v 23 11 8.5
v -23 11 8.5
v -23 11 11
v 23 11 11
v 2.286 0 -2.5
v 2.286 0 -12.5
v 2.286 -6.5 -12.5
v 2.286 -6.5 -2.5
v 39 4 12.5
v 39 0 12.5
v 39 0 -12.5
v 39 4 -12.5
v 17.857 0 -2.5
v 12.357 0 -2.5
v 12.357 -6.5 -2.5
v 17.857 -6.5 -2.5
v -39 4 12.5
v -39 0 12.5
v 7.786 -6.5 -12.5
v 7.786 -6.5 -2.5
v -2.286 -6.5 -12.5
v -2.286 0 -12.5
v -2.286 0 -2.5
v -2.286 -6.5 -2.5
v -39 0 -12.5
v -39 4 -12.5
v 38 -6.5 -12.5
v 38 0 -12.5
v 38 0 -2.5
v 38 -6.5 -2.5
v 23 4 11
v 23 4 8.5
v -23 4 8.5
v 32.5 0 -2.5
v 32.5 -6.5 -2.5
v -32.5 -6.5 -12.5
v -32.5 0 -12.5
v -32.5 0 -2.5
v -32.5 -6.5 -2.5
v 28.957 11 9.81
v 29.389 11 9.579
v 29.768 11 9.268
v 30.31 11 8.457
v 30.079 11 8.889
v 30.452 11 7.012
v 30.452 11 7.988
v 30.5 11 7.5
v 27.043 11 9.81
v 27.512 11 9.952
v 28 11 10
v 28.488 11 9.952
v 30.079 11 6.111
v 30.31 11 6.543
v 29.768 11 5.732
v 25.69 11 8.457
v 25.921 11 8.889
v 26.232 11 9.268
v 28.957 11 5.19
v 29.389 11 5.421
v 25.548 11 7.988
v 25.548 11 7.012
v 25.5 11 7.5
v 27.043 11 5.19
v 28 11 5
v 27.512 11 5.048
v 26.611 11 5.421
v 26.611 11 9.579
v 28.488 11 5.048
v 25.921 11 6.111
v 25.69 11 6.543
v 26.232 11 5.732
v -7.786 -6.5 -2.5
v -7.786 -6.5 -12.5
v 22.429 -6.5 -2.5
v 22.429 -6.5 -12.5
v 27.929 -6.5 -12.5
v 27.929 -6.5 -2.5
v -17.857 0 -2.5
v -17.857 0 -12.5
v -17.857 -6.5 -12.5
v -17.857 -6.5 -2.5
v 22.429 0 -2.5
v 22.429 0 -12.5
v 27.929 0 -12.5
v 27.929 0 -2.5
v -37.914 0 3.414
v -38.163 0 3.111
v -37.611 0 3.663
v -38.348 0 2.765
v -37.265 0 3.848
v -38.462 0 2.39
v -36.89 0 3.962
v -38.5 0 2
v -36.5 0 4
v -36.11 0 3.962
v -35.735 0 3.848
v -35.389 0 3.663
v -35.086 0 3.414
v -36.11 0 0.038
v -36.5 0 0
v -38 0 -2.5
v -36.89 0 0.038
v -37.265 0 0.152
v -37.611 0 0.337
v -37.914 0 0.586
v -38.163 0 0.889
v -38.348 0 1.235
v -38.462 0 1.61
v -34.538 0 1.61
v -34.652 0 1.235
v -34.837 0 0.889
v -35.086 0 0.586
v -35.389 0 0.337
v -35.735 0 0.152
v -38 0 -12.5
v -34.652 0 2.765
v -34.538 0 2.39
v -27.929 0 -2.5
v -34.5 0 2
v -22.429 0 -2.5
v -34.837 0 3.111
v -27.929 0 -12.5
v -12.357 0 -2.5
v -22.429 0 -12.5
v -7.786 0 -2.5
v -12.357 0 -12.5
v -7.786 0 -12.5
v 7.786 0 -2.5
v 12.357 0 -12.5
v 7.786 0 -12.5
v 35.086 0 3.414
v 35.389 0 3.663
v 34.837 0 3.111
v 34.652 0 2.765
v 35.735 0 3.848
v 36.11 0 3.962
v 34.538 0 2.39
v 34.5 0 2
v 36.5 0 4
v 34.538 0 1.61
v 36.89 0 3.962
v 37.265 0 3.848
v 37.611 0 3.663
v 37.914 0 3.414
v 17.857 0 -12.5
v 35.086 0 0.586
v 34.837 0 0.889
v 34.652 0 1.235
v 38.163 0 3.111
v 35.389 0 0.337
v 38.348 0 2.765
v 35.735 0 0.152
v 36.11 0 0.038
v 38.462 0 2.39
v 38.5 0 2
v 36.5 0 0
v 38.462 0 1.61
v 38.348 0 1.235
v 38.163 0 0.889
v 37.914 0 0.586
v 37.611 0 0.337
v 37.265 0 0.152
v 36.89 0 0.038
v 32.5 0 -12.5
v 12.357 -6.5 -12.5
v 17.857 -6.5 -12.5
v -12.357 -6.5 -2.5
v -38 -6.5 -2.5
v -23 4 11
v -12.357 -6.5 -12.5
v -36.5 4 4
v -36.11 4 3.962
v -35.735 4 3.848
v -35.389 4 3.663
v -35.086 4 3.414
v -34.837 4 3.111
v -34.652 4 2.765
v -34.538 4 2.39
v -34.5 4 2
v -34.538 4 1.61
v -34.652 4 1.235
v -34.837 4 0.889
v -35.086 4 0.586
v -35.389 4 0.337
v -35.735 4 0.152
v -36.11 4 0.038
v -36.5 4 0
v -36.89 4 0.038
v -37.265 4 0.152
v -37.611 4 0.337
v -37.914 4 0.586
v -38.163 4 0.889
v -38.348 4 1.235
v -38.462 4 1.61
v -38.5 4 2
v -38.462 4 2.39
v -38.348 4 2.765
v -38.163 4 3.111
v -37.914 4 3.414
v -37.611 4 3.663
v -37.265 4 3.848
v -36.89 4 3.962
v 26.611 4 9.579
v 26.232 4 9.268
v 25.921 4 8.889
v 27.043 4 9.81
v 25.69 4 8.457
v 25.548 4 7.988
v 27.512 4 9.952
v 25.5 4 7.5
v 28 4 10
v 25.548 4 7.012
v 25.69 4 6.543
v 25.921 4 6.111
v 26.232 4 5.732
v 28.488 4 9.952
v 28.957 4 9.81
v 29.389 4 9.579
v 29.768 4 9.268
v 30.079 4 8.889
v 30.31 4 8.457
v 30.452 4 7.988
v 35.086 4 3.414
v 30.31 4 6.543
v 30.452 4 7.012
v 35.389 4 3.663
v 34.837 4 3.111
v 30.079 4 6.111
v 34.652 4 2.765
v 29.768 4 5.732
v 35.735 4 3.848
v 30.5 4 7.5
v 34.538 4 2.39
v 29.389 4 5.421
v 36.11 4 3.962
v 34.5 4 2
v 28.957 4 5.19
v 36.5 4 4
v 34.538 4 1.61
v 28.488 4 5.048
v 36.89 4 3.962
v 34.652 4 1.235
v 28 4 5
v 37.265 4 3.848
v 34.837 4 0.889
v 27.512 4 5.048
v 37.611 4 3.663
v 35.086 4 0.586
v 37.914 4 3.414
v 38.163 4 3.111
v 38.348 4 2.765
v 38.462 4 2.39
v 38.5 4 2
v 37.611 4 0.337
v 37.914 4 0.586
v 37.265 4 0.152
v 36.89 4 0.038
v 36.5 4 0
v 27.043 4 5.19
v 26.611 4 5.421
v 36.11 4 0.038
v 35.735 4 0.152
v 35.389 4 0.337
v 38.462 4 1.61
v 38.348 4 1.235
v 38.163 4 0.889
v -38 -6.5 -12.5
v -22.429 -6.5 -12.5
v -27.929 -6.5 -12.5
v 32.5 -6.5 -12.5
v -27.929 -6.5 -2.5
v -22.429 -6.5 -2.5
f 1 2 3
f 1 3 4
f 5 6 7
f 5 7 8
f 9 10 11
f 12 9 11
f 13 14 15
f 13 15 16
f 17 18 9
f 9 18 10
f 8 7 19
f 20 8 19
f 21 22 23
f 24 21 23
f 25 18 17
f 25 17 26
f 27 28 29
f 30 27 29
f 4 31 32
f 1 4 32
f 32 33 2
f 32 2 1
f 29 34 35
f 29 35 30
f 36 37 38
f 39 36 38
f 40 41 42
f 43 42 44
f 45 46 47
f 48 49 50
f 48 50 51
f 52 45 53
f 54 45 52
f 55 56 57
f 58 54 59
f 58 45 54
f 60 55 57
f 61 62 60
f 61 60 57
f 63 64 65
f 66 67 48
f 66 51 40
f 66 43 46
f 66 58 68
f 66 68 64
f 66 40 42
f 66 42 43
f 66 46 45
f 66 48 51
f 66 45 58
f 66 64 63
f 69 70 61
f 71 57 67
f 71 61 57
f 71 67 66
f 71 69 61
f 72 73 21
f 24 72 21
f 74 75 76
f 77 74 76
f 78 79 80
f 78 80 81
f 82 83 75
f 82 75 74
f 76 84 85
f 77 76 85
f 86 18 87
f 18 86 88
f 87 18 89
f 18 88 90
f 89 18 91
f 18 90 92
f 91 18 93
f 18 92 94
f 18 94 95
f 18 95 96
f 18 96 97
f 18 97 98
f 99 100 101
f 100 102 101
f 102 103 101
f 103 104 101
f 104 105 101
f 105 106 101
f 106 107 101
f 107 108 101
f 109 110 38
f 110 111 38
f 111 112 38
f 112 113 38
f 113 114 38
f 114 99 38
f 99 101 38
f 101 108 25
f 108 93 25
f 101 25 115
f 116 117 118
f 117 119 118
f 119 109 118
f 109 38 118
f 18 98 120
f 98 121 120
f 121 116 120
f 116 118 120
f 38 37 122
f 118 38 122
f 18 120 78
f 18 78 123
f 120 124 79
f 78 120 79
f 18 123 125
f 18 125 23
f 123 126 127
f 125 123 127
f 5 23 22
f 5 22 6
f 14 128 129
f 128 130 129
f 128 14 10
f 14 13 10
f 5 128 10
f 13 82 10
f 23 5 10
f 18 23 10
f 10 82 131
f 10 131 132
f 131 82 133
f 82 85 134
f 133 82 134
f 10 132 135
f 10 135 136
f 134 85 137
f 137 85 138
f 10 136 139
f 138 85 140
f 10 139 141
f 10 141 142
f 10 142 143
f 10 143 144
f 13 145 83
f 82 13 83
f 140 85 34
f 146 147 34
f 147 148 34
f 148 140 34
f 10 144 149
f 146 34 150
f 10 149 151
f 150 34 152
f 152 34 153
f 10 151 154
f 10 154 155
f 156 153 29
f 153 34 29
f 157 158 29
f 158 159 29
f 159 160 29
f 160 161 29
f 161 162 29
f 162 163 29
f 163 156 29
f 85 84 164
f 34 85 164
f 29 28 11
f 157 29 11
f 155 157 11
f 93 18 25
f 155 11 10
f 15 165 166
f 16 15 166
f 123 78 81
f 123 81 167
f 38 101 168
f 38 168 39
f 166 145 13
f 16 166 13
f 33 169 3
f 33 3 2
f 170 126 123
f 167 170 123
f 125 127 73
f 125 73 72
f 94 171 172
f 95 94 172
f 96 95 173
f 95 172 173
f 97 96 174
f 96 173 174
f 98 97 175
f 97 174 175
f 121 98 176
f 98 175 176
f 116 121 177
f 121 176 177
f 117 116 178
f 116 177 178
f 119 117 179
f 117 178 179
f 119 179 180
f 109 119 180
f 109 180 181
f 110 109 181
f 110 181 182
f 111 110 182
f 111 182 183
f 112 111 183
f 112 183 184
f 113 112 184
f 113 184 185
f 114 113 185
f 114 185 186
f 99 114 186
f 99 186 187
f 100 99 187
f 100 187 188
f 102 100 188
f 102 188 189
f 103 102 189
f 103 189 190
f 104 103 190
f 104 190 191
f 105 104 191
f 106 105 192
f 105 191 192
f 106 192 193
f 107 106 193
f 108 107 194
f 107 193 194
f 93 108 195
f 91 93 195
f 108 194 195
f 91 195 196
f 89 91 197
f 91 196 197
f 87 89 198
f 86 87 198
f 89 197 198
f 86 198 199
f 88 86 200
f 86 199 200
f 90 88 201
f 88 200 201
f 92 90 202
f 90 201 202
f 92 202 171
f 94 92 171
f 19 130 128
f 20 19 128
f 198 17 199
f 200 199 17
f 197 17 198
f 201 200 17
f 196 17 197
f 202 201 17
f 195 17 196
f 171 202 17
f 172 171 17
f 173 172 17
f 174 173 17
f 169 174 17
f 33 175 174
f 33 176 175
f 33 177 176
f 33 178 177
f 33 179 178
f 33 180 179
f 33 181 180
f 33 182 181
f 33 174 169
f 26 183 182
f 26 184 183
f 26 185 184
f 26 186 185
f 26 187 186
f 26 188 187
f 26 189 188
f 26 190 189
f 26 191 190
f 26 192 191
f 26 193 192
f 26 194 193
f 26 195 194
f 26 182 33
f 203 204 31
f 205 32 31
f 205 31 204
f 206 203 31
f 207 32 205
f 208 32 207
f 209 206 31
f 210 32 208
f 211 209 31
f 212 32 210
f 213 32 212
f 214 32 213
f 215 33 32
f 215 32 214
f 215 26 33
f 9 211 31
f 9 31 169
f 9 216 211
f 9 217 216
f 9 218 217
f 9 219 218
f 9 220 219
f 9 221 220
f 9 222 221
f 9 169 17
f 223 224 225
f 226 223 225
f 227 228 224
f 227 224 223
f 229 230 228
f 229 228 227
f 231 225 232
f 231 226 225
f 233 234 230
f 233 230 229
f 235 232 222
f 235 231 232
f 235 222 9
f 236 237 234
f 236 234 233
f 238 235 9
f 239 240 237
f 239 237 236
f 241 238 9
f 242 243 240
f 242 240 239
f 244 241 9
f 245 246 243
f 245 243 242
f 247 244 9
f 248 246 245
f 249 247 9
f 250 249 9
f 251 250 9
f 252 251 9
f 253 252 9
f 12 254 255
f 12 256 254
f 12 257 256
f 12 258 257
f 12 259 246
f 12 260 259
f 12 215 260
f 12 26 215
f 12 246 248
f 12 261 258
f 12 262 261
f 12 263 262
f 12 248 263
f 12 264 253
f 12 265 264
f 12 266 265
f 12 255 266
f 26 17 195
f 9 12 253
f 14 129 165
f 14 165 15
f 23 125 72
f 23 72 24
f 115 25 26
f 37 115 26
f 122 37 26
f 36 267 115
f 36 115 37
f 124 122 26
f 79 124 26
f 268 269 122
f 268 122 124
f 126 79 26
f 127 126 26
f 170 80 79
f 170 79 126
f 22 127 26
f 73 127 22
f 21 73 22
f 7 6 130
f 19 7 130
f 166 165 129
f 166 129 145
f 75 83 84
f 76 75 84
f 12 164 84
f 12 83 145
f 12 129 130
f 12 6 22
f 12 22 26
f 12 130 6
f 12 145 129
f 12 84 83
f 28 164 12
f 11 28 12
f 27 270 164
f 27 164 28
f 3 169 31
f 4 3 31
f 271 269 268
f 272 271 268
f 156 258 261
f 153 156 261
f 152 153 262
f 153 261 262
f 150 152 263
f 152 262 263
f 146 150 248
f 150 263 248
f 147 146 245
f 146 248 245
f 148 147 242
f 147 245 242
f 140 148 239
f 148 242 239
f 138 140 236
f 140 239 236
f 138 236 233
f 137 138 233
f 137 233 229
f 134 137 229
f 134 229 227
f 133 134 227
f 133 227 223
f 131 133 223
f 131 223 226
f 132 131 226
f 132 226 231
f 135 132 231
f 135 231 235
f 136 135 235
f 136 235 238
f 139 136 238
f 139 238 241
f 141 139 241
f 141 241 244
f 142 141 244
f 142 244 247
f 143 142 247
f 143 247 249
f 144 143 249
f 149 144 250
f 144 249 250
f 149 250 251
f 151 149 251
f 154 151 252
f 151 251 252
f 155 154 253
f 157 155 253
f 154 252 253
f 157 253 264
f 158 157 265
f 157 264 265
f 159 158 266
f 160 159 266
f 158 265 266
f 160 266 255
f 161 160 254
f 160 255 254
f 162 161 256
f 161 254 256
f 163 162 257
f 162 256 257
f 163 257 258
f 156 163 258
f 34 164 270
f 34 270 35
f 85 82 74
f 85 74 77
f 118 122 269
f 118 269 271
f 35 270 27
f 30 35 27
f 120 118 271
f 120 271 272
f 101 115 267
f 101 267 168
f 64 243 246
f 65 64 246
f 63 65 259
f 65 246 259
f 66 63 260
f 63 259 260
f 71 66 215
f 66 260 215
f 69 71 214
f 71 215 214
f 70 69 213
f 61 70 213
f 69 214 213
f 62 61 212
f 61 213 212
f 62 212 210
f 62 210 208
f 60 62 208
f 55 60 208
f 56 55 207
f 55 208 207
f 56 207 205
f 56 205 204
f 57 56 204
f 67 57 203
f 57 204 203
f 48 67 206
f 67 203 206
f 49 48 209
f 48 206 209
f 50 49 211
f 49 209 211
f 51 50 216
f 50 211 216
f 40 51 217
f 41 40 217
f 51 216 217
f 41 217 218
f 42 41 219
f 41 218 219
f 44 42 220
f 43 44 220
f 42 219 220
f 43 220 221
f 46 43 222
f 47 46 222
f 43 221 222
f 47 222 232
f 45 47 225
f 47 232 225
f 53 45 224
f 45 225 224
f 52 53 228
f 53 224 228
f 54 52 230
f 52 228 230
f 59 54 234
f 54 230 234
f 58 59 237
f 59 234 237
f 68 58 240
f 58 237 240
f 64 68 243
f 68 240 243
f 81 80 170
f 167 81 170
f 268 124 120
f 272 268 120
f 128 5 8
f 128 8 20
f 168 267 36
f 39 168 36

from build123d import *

# Parameters (mm, degrees)
SKETCH1_W           = 78
SKETCH1_H           = 25
BOSS_EXTRUDE1_DEPTH = 4
SKETCH2_R           = 2.5
SKETCH2_W           = 46
SKETCH2_H           = 2.5
BOSS_EXTRUDE2_DEPTH = 7
SKETCH3_W           = 5.5
SKETCH3_H           = 10
BOSS_EXTRUDE3_DEPTH = 6.5
SKETCH4_R           = 2
CUT_EXTRUDE1_DEPTH  = 10


with BuildPart() as part:
    # Sketch1 → Boss-Extrude1 (new body)
    with BuildSketch(Plane(origin=(0, 0, 0), x_dir=(1, 0, 0), z_dir=(0, 1, 0))):
        Rectangle(SKETCH1_W, SKETCH1_H)
    extrude(amount=BOSS_EXTRUDE1_DEPTH)

    # Sketch2 → Boss-Extrude2 (add)
    with BuildSketch(Plane(origin=(0, 4, 0), x_dir=(1, 0, 0), z_dir=(0, 1, 0))):
        with Locations(Location((28, -7.5, 0), (0, 0, 90))):
            Circle(SKETCH2_R)
        with Locations((0, -9.75)):
            Rectangle(SKETCH2_W, SKETCH2_H)
    extrude(amount=BOSS_EXTRUDE2_DEPTH)

    # Sketch3 → Boss-Extrude3 (add)
    with BuildSketch(Plane.XZ):
        with Locations((-35.25, -7.5)):
            Rectangle(SKETCH3_W, SKETCH3_H)
        with Locations((-25.178571429, -7.5)):
            Rectangle(SKETCH3_W, SKETCH3_H)
        with Locations((-15.107142857, -7.5)):
            Rectangle(SKETCH3_W, SKETCH3_H)
        with Locations((-5.035714286, -7.5)):
            Rectangle(SKETCH3_W, SKETCH3_H)
        with Locations((5.035714286, -7.5)):
            Rectangle(SKETCH3_W, SKETCH3_H)
        with Locations((15.107142857, -7.5)):
            Rectangle(SKETCH3_W, SKETCH3_H)
        with Locations((25.178571429, -7.5)):
            Rectangle(SKETCH3_W, SKETCH3_H)
        with Locations((35.25, -7.5)):
            Rectangle(SKETCH3_W, SKETCH3_H)
    extrude(amount=BOSS_EXTRUDE3_DEPTH)

    # Sketch4 → Cut-Extrude1 (cut)
    with BuildSketch(Plane(origin=(0, 4, 0), x_dir=(1, 0, 0), z_dir=(0, 1, 0))):
        with Locations(Location((-36.5, -2, 0), (0, 0, 270))):
            Circle(SKETCH4_R)
        with Locations(Location((36.5, -2, 0), (0, 0, 90))):
            Circle(SKETCH4_R)
    extrude(amount=-CUT_EXTRUDE1_DEPTH, mode=Mode.SUBTRACT)


solid = part.part
